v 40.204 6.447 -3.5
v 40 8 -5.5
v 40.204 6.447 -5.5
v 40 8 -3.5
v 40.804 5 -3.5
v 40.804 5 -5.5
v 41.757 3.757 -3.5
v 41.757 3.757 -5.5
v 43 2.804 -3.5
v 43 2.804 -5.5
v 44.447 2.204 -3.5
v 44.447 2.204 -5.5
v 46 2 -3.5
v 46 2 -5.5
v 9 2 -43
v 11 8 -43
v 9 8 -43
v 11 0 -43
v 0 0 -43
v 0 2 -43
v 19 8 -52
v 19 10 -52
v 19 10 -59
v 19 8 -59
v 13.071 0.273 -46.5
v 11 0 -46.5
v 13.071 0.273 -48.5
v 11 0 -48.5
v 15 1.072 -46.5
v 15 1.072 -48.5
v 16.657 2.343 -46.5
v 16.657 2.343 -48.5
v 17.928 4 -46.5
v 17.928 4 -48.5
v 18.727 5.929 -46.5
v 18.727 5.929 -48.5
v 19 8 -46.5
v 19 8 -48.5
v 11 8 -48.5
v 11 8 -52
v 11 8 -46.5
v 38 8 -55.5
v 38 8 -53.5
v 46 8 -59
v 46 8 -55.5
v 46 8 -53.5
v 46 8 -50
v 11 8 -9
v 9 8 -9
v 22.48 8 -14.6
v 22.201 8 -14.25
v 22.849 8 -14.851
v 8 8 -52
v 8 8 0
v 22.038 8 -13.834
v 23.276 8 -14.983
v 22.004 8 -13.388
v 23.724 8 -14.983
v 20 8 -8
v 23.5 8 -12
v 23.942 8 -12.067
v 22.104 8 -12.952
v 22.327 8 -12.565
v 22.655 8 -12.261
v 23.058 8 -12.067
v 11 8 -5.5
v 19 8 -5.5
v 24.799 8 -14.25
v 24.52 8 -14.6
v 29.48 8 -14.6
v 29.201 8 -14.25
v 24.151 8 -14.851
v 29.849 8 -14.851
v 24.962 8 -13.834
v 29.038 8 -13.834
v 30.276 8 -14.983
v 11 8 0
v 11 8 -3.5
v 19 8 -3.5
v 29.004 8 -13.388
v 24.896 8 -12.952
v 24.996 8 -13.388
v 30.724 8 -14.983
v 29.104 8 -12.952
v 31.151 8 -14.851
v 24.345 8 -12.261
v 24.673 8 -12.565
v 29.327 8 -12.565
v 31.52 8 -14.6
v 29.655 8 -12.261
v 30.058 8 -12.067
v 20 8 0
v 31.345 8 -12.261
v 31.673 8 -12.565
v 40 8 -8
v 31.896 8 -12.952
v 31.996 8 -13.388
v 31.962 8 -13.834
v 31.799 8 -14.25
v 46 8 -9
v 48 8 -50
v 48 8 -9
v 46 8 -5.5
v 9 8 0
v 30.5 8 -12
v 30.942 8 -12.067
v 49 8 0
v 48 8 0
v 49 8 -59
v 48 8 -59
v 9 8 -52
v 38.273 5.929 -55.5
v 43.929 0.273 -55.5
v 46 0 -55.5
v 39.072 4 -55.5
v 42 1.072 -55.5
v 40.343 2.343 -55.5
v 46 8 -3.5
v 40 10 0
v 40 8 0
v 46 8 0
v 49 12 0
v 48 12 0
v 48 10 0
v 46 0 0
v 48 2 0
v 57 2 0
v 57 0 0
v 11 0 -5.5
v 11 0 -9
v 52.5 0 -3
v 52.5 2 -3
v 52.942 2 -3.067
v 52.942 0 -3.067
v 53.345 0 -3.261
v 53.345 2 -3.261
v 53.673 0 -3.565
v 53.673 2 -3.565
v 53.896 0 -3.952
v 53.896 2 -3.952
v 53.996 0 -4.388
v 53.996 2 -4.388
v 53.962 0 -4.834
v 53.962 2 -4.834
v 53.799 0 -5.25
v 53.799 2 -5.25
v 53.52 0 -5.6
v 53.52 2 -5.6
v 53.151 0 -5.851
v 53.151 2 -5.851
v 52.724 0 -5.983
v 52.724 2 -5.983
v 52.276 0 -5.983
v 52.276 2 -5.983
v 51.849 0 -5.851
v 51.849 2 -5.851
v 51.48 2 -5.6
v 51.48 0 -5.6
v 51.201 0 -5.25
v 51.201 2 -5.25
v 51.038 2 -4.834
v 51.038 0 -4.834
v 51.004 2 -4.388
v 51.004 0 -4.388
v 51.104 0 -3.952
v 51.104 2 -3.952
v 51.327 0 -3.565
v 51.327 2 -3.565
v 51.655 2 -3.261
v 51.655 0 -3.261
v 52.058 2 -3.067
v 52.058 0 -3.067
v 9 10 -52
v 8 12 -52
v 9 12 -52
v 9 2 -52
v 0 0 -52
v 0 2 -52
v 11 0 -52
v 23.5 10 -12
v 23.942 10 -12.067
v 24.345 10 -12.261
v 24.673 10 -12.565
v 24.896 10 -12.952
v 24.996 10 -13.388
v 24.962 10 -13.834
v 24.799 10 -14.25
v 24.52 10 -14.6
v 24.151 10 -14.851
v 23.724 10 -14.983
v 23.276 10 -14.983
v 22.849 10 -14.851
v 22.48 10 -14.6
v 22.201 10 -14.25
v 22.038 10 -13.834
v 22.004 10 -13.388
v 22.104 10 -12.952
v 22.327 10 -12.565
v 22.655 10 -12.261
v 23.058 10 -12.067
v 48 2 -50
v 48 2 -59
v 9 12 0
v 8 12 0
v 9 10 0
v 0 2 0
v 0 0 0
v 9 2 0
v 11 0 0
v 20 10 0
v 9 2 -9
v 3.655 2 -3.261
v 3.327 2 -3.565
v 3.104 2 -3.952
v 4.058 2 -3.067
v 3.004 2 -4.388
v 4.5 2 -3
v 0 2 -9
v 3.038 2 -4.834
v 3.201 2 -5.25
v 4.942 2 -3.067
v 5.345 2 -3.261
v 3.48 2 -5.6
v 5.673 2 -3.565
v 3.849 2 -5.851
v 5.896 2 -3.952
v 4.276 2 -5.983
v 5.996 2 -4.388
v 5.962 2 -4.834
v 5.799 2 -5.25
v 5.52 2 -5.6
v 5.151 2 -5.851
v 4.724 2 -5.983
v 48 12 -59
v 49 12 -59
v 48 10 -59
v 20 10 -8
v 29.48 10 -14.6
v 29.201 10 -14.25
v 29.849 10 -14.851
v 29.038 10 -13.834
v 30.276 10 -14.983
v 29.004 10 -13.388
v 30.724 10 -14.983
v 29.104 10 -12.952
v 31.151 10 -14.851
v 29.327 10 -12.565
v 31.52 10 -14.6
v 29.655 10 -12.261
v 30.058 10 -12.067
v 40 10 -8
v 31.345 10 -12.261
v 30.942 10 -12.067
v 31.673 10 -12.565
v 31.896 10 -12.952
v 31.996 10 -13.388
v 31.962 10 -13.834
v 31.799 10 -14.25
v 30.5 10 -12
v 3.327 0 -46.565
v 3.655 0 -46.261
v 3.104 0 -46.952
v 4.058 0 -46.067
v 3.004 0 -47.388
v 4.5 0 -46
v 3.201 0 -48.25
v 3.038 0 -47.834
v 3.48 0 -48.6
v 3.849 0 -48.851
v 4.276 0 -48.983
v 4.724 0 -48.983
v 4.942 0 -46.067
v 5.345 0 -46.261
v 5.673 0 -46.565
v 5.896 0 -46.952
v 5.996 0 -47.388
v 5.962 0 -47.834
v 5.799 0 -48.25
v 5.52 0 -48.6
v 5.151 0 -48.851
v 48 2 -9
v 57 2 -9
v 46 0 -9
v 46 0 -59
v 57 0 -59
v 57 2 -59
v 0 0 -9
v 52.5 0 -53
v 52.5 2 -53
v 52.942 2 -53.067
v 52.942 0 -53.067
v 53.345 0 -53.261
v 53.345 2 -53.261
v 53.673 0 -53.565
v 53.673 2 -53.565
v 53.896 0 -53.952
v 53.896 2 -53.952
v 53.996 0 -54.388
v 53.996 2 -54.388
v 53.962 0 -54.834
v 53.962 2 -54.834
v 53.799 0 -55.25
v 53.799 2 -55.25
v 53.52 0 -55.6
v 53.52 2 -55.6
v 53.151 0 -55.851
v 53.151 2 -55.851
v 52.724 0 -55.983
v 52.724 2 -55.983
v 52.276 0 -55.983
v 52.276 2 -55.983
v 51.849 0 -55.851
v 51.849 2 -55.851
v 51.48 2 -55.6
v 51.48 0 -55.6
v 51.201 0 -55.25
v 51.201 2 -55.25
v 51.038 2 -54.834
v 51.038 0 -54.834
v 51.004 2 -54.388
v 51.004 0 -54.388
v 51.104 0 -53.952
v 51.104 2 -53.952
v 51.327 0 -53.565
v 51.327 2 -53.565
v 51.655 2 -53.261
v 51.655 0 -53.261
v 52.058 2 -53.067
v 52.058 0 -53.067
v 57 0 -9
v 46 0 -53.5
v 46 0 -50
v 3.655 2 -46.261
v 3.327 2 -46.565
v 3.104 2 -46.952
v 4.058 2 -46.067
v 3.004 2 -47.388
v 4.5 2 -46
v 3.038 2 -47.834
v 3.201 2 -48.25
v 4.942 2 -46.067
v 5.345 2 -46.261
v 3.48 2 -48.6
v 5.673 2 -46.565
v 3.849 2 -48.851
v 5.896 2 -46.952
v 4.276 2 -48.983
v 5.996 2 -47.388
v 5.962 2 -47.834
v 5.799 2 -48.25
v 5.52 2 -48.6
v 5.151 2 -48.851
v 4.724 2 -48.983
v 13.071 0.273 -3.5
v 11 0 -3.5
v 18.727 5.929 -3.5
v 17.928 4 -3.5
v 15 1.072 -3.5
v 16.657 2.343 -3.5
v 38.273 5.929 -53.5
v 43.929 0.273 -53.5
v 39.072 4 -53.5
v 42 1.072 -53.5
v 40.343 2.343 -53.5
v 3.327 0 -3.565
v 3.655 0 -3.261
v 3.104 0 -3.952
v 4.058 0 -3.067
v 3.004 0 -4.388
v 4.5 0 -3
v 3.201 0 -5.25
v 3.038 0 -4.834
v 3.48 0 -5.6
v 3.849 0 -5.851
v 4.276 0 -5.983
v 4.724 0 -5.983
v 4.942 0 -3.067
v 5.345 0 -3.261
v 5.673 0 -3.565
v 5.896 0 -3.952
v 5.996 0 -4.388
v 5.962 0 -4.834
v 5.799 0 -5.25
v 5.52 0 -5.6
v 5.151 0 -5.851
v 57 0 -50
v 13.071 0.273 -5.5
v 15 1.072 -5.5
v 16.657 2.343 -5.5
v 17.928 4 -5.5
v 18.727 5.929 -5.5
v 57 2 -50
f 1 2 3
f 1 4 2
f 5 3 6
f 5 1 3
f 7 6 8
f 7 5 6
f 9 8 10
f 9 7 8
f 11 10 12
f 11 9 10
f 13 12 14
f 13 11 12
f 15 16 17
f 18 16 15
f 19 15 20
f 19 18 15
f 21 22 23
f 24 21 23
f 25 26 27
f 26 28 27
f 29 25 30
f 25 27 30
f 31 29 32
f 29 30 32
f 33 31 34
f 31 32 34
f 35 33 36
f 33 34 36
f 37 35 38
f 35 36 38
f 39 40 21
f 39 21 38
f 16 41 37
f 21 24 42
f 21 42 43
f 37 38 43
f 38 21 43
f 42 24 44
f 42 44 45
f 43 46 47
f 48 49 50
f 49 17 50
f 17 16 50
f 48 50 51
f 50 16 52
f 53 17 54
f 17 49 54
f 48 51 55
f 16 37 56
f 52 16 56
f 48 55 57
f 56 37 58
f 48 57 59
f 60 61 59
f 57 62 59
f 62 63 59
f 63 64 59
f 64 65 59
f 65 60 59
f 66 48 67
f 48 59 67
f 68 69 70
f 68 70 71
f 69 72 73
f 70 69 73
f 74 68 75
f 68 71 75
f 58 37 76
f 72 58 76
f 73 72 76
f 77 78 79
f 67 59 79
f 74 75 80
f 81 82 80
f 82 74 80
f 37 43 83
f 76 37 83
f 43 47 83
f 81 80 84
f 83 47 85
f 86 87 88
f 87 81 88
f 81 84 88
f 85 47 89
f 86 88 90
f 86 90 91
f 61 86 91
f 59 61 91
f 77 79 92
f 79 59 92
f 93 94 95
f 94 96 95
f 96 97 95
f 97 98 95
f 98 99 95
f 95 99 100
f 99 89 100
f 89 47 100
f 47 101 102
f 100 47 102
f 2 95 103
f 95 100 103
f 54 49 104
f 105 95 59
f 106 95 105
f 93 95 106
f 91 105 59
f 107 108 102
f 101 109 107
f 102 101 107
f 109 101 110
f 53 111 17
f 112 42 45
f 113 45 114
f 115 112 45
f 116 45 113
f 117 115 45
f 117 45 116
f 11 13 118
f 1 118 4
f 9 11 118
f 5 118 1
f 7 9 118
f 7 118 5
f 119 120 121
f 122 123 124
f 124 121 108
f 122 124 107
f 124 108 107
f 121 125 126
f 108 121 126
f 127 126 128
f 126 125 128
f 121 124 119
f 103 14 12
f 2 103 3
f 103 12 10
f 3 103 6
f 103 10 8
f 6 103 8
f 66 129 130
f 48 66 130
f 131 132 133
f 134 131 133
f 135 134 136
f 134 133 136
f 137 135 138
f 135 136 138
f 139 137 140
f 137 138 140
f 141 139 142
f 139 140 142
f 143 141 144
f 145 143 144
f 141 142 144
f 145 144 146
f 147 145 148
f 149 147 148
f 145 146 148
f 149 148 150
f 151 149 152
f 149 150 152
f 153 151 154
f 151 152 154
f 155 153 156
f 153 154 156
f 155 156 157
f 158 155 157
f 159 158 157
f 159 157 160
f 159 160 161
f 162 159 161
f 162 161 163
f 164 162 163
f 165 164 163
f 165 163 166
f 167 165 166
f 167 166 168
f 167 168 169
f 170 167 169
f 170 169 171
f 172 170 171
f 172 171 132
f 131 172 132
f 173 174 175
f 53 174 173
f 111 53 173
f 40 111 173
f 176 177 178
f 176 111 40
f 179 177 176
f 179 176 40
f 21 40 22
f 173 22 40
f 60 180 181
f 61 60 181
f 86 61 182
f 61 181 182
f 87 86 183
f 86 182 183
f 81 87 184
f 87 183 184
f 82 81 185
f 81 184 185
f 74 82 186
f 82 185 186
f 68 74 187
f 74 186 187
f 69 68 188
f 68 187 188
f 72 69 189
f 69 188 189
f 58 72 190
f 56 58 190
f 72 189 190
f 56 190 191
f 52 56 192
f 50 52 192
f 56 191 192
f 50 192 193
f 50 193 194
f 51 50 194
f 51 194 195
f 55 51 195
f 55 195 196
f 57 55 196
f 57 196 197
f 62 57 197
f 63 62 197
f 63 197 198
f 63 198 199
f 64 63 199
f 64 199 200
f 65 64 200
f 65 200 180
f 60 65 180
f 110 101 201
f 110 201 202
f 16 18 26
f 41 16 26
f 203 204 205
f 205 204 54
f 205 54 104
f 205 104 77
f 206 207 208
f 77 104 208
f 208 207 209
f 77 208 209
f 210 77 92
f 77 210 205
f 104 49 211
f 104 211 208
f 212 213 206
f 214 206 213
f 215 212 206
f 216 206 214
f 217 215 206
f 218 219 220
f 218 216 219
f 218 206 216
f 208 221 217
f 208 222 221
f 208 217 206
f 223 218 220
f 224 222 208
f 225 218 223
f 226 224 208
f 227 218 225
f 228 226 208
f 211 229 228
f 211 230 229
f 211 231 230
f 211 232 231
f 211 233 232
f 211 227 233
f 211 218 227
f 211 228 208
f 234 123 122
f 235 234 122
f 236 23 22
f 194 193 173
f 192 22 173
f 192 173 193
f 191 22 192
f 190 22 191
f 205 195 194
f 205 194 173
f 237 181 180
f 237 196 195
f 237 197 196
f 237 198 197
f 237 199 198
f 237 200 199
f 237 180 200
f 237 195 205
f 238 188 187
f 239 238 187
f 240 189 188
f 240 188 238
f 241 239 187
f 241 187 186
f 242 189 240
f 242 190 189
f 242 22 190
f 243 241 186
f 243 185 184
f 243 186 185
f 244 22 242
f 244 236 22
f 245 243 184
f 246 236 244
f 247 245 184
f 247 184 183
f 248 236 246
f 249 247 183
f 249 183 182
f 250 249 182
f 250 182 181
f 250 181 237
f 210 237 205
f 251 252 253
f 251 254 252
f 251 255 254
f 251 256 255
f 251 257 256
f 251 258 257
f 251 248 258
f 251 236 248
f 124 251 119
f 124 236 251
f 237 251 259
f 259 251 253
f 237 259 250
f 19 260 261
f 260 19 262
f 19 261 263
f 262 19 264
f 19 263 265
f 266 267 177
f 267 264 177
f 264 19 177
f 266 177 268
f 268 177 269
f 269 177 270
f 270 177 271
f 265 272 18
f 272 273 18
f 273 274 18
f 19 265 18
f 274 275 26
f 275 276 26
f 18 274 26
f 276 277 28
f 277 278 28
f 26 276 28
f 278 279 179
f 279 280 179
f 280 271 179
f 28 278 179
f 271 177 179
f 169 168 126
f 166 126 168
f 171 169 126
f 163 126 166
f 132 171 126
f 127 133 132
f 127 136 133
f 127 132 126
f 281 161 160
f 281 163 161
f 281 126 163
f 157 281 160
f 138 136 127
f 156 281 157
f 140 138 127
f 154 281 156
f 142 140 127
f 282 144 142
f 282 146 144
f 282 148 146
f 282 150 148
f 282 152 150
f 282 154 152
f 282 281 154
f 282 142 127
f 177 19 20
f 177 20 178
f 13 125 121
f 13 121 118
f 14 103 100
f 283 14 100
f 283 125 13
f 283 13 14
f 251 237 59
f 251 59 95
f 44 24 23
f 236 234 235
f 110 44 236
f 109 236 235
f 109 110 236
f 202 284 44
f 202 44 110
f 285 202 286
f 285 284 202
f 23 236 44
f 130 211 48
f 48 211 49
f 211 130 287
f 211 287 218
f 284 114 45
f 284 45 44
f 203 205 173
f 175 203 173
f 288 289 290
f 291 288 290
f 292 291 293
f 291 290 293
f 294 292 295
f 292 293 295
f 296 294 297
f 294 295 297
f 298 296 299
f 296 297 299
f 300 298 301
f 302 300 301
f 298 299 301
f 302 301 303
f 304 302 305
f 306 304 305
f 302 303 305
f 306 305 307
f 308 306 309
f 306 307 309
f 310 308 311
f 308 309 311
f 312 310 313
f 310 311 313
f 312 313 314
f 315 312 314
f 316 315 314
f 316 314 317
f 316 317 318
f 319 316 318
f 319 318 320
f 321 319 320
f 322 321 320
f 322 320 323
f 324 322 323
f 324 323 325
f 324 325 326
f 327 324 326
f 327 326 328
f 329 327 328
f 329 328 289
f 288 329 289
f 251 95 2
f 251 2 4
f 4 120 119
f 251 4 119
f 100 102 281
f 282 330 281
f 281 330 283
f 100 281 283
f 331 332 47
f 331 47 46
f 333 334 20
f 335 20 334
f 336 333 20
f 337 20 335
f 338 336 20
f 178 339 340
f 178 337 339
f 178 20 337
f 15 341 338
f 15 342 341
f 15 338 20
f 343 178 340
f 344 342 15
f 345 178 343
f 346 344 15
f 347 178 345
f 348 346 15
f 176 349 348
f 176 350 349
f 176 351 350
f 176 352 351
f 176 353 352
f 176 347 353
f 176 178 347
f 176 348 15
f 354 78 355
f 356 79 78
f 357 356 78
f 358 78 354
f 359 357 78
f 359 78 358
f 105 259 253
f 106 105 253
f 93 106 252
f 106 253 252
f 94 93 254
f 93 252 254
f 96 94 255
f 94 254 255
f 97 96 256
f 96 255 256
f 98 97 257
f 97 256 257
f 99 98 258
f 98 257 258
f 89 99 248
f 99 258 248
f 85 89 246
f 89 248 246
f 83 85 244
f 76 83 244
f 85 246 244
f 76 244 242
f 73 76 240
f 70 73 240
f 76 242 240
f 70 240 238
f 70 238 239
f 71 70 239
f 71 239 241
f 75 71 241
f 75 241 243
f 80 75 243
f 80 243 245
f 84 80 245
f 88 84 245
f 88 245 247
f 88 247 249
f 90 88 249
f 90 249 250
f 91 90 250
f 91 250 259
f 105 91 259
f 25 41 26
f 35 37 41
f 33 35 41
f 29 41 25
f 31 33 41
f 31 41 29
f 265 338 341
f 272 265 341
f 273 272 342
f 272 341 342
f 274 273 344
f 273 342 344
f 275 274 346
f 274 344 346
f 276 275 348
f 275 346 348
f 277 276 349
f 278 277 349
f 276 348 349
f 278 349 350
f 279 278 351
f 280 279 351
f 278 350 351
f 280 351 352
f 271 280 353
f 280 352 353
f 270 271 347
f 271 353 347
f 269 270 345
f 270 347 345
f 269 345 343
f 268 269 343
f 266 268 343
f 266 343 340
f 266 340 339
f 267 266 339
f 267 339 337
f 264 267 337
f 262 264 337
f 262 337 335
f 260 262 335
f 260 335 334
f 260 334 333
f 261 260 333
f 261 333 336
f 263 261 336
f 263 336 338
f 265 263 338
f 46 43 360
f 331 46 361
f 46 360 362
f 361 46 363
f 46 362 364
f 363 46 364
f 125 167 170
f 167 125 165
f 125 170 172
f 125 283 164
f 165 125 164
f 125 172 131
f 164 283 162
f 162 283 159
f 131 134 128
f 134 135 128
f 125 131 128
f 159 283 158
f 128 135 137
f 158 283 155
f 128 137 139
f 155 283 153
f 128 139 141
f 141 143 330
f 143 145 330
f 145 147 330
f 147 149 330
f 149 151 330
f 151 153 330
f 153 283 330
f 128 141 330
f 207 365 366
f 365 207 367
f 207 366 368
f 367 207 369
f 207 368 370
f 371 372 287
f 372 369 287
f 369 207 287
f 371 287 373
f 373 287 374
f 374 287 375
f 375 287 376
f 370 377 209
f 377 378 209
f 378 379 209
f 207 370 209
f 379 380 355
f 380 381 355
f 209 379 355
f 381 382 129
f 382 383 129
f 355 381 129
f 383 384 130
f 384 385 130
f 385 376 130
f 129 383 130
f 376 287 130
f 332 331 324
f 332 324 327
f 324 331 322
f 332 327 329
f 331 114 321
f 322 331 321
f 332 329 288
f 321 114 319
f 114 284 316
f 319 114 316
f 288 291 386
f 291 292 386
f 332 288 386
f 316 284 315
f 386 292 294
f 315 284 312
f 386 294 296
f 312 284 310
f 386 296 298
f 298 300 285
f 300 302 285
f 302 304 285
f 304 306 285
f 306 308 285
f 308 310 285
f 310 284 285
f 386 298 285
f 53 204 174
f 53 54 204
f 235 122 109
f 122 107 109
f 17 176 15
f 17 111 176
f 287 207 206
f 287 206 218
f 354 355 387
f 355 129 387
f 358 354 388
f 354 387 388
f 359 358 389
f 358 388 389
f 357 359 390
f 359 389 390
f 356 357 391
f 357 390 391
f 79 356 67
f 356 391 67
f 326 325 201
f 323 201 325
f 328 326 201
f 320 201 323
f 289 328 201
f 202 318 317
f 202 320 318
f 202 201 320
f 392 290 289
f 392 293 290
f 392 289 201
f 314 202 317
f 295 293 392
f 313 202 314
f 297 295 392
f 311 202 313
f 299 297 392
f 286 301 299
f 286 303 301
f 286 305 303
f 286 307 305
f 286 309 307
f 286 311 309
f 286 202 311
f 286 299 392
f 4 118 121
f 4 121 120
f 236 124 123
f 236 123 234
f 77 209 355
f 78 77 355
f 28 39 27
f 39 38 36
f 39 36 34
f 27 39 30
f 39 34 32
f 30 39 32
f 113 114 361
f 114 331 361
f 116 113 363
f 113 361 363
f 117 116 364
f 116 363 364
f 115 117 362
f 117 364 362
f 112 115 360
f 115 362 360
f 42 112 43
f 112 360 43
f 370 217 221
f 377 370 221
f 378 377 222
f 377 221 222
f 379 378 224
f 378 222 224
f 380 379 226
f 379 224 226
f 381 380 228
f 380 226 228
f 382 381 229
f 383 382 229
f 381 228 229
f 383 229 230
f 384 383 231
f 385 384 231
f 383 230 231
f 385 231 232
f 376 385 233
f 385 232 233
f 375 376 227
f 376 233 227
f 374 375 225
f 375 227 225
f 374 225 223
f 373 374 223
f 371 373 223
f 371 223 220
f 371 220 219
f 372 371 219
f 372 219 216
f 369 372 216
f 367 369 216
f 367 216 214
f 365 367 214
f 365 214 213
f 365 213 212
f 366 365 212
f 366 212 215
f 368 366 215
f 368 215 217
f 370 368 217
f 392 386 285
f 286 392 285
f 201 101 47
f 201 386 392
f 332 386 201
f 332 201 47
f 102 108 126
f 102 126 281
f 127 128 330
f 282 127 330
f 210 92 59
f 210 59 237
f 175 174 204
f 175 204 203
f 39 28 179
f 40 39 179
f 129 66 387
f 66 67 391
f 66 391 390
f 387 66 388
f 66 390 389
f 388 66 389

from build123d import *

# Parameters (mm, degrees)
SKETCH1_W           = 57
SKETCH1_H           = 59
BOSS_EXTRUDE1_DEPTH = 10
SKETCH2_W           = 41
SKETCH2_H           = 10
CUT_EXTRUDE1_DEPTH  = 9
SKETCH4_W           = 10
SKETCH4_H           = 7
CUT_EXTRUDE3_DEPTH  = 83.643814046
SKETCH5_W           = 34
SKETCH5_H           = 10
CUT_EXTRUDE4_DEPTH  = 9
SKETCH8_W           = 20
SKETCH8_H           = 10
CUT_EXTRUDE5_DEPTH  = 8
SKETCH9_W           = 35
SKETCH9_H           = 59
CUT_EXTRUDE6_DEPTH  = 8
SKETCH10_W          = 9
SKETCH10_H          = 7
CUT_EXTRUDE7_DEPTH  = 83.643814046
SKETCH11_W          = 9
SKETCH11_H          = 9
CUT_EXTRUDE8_DEPTH  = 8
SKETCH12_W          = 9
SKETCH12_H          = 9
CUT_EXTRUDE9_DEPTH  = 8
SKETCH13_W          = 9
SKETCH13_H          = 9
CUT_EXTRUDE10_DEPTH = 8
SKETCH14_W          = 9
SKETCH14_H          = 9
CUT_EXTRUDE11_DEPTH = 8
SKETCH15_W          = 2
SKETCH15_H          = 41
CUT_EXTRUDE12_DEPTH = 8
SKETCH16_W          = 2
SKETCH16_H          = 34
CUT_EXTRUDE13_DEPTH = 8
SKETCH31_W          = 2
SKETCH31_H          = 8
REVOLVE3_ANGLE      = 90
SKETCH32_W          = 2
SKETCH32_H          = 8
REVOLVE4_ANGLE      = 90
SKETCH33_W          = 6
SKETCH33_H          = 2
REVOLVE5_ANGLE      = 90
SKETCH34_W          = 2
SKETCH34_H          = 8
REVOLVE6_ANGLE      = 90
SKETCH41_R          = 1.5
CUT_EXTRUDE14_DEPTH = 83.42572414
SKETCH42_R          = 1.5
CUT_EXTRUDE15_DEPTH = 83.643814046
SKETCH46_W          = 59
SKETCH46_H          = 2
BOSS_EXTRUDE3_DEPTH = 1
SKETCH47_W          = 1
SKETCH47_H          = 59
BOSS_EXTRUDE4_DEPTH = 2
SKETCH48_W          = 52
SKETCH48_H          = 2
BOSS_EXTRUDE5_DEPTH = 1
SKETCH49_W          = 1
SKETCH49_H          = 52
BOSS_EXTRUDE6_DEPTH = 2


with BuildPart() as part:
    # Sketch1 → Boss-Extrude1 (new body)
    with BuildSketch(Plane(origin=(0, 0, 0), x_dir=(1, 0, 0), z_dir=(0, 1, 0))):
        with Locations((28.5, 29.5)):
            Rectangle(SKETCH1_W, SKETCH1_H)
    extrude(amount=BOSS_EXTRUDE1_DEPTH)

    # Sketch2 → Cut-Extrude1 (cut)
    with BuildSketch(Plane(origin=(57, 0, 0), x_dir=(0, 0, -1), z_dir=(1, 0, 0))):
        with Locations((29.5, 5)):
            Rectangle(SKETCH2_W, SKETCH2_H)
    extrude(amount=-CUT_EXTRUDE1_DEPTH, mode=Mode.SUBTRACT)

    # Sketch4 → Cut-Extrude3 (cut, through all)
    with BuildSketch(Plane(origin=(0, 10, 0), x_dir=(1, 0, 0), z_dir=(0, 1, 0))):
        with Locations((5, 55.5)):
            Rectangle(SKETCH4_W, SKETCH4_H)
    extrude(amount=-CUT_EXTRUDE3_DEPTH, mode=Mode.SUBTRACT)

    # Sketch5 → Cut-Extrude4 (cut)
    with BuildSketch(Plane.ZY):
        with Locations((-26, 5)):
            Rectangle(SKETCH5_W, SKETCH5_H)
    extrude(amount=-CUT_EXTRUDE4_DEPTH, mode=Mode.SUBTRACT)

    # Sketch8 → Cut-Extrude5 (cut)
    with BuildSketch(Plane.XY):
        with Locations((30, 5)):
            Rectangle(SKETCH8_W, SKETCH8_H)
    extrude(amount=-CUT_EXTRUDE5_DEPTH, mode=Mode.SUBTRACT)

    # Sketch9 → Cut-Extrude6 (cut)
    with BuildSketch(Plane(origin=(0, 0, 0), x_dir=(-1, 0, 0), z_dir=(0, -1, 0))):
        with Locations((-28.5, 29.5)):
            Rectangle(SKETCH9_W, SKETCH9_H)
    extrude(amount=-CUT_EXTRUDE6_DEPTH, mode=Mode.SUBTRACT)

    # Sketch10 → Cut-Extrude7 (cut, through all)
    with BuildSketch(Plane(origin=(0, 10, 0), x_dir=(1, 0, 0), z_dir=(0, 1, 0))):
        with Locations((14.5, 55.5)):
            Rectangle(SKETCH10_W, SKETCH10_H)
    extrude(amount=-CUT_EXTRUDE7_DEPTH, mode=Mode.SUBTRACT)

    # Sketch11 → Cut-Extrude8 (cut)
    with BuildSketch(Plane(origin=(0, 10, 0), x_dir=(1, 0, 0), z_dir=(0, 1, 0))):
        with Locations((52.5, 4.5)):
            Rectangle(SKETCH11_W, SKETCH11_H)
    extrude(amount=-CUT_EXTRUDE8_DEPTH, mode=Mode.SUBTRACT)

    # Sketch12 → Cut-Extrude9 (cut)
    with BuildSketch(Plane(origin=(0, 10, 0), x_dir=(1, 0, 0), z_dir=(0, 1, 0))):
        with Locations((52.5, 54.5)):
            Rectangle(SKETCH12_W, SKETCH12_H)
    extrude(amount=-CUT_EXTRUDE9_DEPTH, mode=Mode.SUBTRACT)

    # Sketch13 → Cut-Extrude10 (cut)
    with BuildSketch(Plane(origin=(0, 10, 0), x_dir=(1, 0, 0), z_dir=(0, 1, 0))):
        with Locations((4.5, 47.5)):
            Rectangle(SKETCH13_W, SKETCH13_H)
    extrude(amount=-CUT_EXTRUDE10_DEPTH, mode=Mode.SUBTRACT)

    # Sketch14 → Cut-Extrude11 (cut)
    with BuildSketch(Plane(origin=(0, 10, 0), x_dir=(1, 0, 0), z_dir=(0, 1, 0))):
        with Locations((4.5, 4.5)):
            Rectangle(SKETCH14_W, SKETCH14_H)
    extrude(amount=-CUT_EXTRUDE11_DEPTH, mode=Mode.SUBTRACT)

    # Sketch15 → Cut-Extrude12 (cut)
    with BuildSketch(Plane(origin=(0, 0, 0), x_dir=(-1, 0, 0), z_dir=(0, -1, 0))):
        with Locations((-47, 29.5)):
            Rectangle(SKETCH15_W, SKETCH15_H)
    extrude(amount=-CUT_EXTRUDE12_DEPTH, mode=Mode.SUBTRACT)

    # Sketch16 → Cut-Extrude13 (cut)
    with BuildSketch(Plane(origin=(0, 0, 0), x_dir=(-1, 0, 0), z_dir=(0, -1, 0))):
        with Locations((-10, 26)):
            Rectangle(SKETCH16_W, SKETCH16_H)
    extrude(amount=-CUT_EXTRUDE13_DEPTH, mode=Mode.SUBTRACT)

    # Sketch31 → Revolve3 (revolve)
    with BuildSketch(Plane(origin=(11, 0, 0), x_dir=(0, 0, -1), z_dir=(1, 0, 0))):
        with Locations((4.5, 4)):
            Rectangle(SKETCH31_W, SKETCH31_H)
    revolve(axis=Axis((11, 8, -3.5), (0, 0, 1)), revolution_arc=REVOLVE3_ANGLE)

    # Sketch32 → Revolve4 (revolve)
    with BuildSketch(Plane(origin=(11, 0, 0), x_dir=(0, 0, -1), z_dir=(1, 0, 0))):
        with Locations((47.5, 4)):
            Rectangle(SKETCH32_W, SKETCH32_H)
    revolve(axis=Axis((11, 8, -46.5), (0, 0, 1)), revolution_arc=REVOLVE4_ANGLE)

    # Sketch33 → Revolve5 (revolve)
    with BuildSketch(Plane.XZ.offset(-8)):
        with Locations((43, -4.5)):
            Rectangle(SKETCH33_W, SKETCH33_H)
    revolve(axis=Axis((46, 8, -3.5), (0, 0, 1)), revolution_arc=REVOLVE5_ANGLE)

    # Sketch34 → Revolve6 (revolve)
    with BuildSketch(Plane.ZY.offset(-46)):
        with Locations((-54.5, 4)):
            Rectangle(SKETCH34_W, SKETCH34_H)
    revolve(axis=Axis((46, 8, -53.5), (0, 0, -1)), revolution_arc=REVOLVE6_ANGLE)

    # Sketch41 → Cut-Extrude14 (cut, through all)
    with BuildSketch(Plane(origin=(0, 2, 0), x_dir=(1, 0, 0), z_dir=(0, 1, 0))):
        with Locations(Location((52.5, 4.5, 0), (0, 0, 270))):
            Circle(SKETCH41_R)
        with Locations(Location((52.5, 54.5, 0), (0, 0, 270))):
            Circle(SKETCH41_R)
        with Locations(Location((4.5, 4.5, 0), (0, 0, 270))):
            Circle(SKETCH41_R)
        with Locations(Location((4.5, 47.5, 0), (0, 0, 270))):
            Circle(SKETCH41_R)
    extrude(amount=-CUT_EXTRUDE14_DEPTH, mode=Mode.SUBTRACT)

    # Sketch42 → Cut-Extrude15 (cut, through all)
    with BuildSketch(Plane(origin=(0, 10, 0), x_dir=(1, 0, 0), z_dir=(0, 1, 0))):
        with Locations(Location((23.5, 13.5, 0), (0, 0, 270))):
            Circle(SKETCH42_R)
        with Locations(Location((30.5, 13.5, 0), (0, 0, 270))):
            Circle(SKETCH42_R)
    extrude(amount=-CUT_EXTRUDE15_DEPTH, mode=Mode.SUBTRACT)

    # Sketch46 → Boss-Extrude3 (add)
    with BuildSketch(Plane(origin=(48, 0, 0), x_dir=(0, 0, -1), z_dir=(1, 0, 0))):
        with Locations((29.5, 9)):
            Rectangle(SKETCH46_W, SKETCH46_H)
    extrude(amount=BOSS_EXTRUDE3_DEPTH)

    # Sketch47 → Boss-Extrude4 (add)
    with BuildSketch(Plane(origin=(0, 10, 0), x_dir=(1, 0, 0), z_dir=(0, 1, 0))):
        with Locations((48.5, 29.5)):
            Rectangle(SKETCH47_W, SKETCH47_H)
    extrude(amount=BOSS_EXTRUDE4_DEPTH)

    # Sketch48 → Boss-Extrude5 (add)
    with BuildSketch(Plane.ZY.offset(-9)):
        with Locations((-26, 9)):
            Rectangle(SKETCH48_W, SKETCH48_H)
    extrude(amount=BOSS_EXTRUDE5_DEPTH)

    # Sketch49 → Boss-Extrude6 (add)
    with BuildSketch(Plane(origin=(0, 10, 0), x_dir=(1, 0, 0), z_dir=(0, 1, 0))):
        with Locations((8.5, 26)):
            Rectangle(SKETCH49_W, SKETCH49_H)
    extrude(amount=BOSS_EXTRUDE6_DEPTH)


solid = part.part
